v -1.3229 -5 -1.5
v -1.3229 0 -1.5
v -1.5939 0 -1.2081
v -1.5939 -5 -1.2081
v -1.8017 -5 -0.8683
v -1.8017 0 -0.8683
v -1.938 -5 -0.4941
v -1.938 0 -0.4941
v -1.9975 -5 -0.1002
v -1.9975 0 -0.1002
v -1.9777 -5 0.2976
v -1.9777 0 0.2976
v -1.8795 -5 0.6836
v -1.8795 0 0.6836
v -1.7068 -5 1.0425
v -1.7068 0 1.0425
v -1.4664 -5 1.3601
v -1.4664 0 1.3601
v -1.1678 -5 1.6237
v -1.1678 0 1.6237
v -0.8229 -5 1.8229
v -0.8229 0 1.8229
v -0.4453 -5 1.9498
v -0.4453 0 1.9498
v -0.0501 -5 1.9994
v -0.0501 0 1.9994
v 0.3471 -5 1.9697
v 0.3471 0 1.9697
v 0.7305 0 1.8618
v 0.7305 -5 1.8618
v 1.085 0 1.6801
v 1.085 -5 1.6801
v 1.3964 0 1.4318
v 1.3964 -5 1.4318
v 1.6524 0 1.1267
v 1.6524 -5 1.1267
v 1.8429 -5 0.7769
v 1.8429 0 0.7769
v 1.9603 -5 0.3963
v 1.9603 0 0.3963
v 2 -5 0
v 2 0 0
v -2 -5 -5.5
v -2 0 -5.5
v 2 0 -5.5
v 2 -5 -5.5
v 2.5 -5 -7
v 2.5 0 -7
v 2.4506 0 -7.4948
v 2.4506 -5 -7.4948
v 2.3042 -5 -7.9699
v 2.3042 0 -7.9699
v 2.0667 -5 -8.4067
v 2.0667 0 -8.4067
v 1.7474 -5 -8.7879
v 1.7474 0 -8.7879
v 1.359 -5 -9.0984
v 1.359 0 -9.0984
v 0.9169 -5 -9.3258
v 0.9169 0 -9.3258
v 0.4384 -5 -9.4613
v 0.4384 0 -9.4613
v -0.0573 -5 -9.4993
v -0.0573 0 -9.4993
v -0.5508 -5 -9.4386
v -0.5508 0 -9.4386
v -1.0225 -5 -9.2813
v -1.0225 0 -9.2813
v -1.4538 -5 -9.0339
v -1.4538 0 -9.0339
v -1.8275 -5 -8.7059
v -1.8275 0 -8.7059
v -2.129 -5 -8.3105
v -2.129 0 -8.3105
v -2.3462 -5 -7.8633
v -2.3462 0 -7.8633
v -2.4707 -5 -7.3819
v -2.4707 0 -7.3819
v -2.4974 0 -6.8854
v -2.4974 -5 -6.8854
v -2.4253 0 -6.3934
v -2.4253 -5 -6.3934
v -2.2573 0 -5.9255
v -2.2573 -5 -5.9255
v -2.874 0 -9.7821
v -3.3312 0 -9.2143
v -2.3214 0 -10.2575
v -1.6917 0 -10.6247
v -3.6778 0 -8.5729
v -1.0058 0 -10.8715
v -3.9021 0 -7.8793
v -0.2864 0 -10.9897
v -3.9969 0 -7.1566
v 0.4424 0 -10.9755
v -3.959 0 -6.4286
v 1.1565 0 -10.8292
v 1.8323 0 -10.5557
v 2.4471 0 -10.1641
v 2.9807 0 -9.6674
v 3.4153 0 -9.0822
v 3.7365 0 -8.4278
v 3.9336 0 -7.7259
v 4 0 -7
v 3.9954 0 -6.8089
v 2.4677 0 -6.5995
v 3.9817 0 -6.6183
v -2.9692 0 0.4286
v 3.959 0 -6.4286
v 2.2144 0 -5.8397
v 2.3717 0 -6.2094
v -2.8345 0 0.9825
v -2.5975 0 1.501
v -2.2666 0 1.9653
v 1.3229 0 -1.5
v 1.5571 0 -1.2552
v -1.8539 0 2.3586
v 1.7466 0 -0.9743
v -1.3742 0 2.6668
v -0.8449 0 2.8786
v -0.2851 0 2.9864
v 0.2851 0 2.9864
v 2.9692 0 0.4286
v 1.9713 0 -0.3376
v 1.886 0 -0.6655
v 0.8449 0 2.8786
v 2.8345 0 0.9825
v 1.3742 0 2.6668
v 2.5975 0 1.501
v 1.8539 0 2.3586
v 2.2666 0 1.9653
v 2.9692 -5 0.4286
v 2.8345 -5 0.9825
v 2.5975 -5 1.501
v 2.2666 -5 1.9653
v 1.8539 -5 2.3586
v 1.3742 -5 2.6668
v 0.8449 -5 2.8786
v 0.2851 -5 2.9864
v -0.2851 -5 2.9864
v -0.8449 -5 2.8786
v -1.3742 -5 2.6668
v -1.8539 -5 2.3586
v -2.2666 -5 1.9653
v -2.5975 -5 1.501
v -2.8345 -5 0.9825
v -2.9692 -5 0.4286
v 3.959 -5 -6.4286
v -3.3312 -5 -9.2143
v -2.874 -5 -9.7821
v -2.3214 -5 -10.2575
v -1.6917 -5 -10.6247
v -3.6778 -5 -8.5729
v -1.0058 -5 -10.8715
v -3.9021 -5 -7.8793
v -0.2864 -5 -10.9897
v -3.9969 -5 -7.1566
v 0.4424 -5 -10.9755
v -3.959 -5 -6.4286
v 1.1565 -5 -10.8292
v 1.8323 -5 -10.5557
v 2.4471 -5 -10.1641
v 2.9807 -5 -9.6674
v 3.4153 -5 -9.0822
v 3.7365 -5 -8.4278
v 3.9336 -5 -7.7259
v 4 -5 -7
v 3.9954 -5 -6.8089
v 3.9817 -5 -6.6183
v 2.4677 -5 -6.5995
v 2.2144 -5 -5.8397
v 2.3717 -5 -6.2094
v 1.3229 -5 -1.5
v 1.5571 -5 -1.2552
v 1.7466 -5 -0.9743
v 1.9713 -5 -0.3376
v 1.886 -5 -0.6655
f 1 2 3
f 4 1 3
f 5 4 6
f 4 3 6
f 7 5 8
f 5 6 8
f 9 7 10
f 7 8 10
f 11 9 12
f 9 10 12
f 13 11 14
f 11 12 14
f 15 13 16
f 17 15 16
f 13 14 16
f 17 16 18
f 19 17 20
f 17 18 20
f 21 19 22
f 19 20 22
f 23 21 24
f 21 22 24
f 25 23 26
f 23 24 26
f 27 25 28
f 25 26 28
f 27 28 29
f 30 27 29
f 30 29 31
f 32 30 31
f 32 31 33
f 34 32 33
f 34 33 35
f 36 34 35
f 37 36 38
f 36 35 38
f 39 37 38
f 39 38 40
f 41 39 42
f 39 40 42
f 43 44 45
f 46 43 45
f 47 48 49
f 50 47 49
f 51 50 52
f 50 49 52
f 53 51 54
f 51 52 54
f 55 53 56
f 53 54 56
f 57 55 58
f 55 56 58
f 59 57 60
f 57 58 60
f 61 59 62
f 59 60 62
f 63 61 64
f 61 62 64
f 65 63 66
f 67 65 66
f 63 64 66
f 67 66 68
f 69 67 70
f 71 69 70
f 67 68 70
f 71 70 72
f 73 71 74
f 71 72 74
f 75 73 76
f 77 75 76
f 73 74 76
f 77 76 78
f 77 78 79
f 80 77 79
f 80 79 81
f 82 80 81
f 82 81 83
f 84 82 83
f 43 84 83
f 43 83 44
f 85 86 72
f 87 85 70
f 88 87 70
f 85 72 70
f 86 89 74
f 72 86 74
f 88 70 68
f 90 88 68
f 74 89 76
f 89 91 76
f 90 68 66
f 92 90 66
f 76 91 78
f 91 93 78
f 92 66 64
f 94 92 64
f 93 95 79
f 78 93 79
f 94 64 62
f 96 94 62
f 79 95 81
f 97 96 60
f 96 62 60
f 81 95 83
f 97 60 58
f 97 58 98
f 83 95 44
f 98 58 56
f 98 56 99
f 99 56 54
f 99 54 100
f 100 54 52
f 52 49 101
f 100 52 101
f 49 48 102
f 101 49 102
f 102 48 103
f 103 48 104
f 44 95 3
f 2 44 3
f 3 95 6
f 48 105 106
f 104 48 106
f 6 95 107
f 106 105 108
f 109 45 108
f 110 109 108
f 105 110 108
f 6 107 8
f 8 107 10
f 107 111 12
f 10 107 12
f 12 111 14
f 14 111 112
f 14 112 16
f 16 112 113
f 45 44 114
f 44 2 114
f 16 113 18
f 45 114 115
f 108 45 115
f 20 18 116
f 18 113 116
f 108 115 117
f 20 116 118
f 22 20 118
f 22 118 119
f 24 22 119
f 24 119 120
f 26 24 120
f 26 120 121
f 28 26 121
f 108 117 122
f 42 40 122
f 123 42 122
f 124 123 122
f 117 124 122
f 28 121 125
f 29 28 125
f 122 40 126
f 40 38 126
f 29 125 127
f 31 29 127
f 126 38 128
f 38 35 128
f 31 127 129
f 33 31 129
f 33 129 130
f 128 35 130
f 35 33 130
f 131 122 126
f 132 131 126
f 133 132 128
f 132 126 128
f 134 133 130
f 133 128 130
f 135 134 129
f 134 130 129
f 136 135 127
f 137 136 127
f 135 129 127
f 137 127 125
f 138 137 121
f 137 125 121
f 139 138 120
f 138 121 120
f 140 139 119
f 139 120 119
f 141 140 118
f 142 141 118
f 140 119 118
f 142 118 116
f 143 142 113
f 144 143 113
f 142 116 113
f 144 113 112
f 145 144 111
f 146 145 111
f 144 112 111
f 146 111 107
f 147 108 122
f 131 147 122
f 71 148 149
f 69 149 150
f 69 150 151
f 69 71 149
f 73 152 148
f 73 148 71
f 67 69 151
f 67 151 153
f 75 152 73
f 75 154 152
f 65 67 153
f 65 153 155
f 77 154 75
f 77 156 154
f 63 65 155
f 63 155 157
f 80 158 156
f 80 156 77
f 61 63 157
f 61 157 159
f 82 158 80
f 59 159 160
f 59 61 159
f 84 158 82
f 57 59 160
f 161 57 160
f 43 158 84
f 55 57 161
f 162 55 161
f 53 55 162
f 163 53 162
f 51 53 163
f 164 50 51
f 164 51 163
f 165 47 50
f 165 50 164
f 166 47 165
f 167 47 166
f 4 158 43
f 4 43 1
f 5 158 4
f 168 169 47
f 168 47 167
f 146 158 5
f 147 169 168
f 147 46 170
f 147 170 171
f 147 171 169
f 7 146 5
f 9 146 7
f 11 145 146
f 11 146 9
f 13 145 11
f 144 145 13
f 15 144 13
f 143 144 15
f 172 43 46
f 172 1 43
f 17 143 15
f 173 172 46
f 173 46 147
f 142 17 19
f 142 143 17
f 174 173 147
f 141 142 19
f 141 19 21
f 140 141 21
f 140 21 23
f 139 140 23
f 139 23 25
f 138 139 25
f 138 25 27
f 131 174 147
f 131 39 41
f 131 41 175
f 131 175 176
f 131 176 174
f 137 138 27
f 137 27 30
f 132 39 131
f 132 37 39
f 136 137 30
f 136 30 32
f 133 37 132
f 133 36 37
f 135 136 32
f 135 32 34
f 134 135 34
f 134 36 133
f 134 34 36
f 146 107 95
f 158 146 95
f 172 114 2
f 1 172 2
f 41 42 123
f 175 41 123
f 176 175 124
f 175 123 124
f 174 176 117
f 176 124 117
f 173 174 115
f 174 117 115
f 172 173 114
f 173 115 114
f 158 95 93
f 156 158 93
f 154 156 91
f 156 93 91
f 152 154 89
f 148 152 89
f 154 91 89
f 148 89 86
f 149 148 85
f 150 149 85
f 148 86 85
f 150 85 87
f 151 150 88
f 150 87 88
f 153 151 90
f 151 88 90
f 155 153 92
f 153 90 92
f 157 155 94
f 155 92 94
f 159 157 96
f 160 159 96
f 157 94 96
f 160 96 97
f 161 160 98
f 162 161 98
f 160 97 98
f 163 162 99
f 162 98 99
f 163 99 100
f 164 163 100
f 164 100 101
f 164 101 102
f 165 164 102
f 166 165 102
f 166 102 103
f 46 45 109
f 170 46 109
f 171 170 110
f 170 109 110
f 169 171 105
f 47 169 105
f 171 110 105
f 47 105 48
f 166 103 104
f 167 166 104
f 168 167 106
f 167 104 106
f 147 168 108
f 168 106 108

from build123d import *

# Parameters (mm, degrees)
F1_DEPTH = 5


with BuildPart() as f1:
    # F0 (on Front) → F1 (new body)
    with BuildSketch(Plane.XZ):
        with BuildLine():
            ThreePointArc((0, -3), (2.12132, -2.12132), (3, 0))
            ThreePointArc((3, 0), (2.992298, 0.214837), (2.96923, 0.428571))
            ThreePointArc((2.96923, 0.428571), (0, 3), (-2.96923, 0.428571))
            ThreePointArc((-2.96923, 0.428571), (-2.267787, -1.963961), (0, -3))
        make_face()
        with BuildLine():
            ThreePointArc((-1.322876, -1.5), (-0.822876, 1.822876), (2, 0))
            ThreePointArc((2, 0), (1.822876, -0.822876), (1.322876, -1.5))
            ThreePointArc((1.322876, -1.5), (0, -2), (-1.322876, -1.5))
        make_face(mode=Mode.SUBTRACT)
        with BuildLine():
            ThreePointArc((2.96923, 0.428571), (2.992298, 0.214837), (3, 0))
            ThreePointArc((3, 0), (2.12132, -2.12132), (0, -3))
            ThreePointArc((0, -3), (2.618615, -3.976284), (3.958973, -6.428571))
            Line((3.958973, -6.428571), (2.96923, 0.428571))
        make_face()
        with BuildLine():
            ThreePointArc((-3.958973, -6.428571), (-2.618615, -3.976284), (0, -3))
            ThreePointArc((0, -3), (-2.267787, -1.963961), (-2.96923, 0.428571))
            Line((-2.96923, 0.428571), (-3.958973, -6.428571))
        make_face()
        with BuildLine():
            ThreePointArc((3.958973, -6.428571), (2.618615, -3.976284), (0, -3))
            ThreePointArc((0, -3), (-2.618615, -3.976284), (-3.958973, -6.428571))
            ThreePointArc((-3.958973, -6.428571), (-0.28645, -10.98973), (4, -7))
            ThreePointArc((4, -7), (3.98973, -6.71355), (3.958973, -6.428571))
        make_face()
        with BuildLine():
            ThreePointArc((2, -5.5), (2.371708, -6.209431), (2.5, -7))
            ThreePointArc((2.5, -7), (-0.790569, -9.371708), (-2, -5.5))
            ThreePointArc((-2, -5.5), (0, -4.5), (2, -5.5))
        make_face(mode=Mode.SUBTRACT)
        with BuildLine():
            Line((-2, -5.5), (2, -5.5))
            ThreePointArc((2, -5.5), (0, -4.5), (-2, -5.5))
        make_face()
        with BuildLine():
            Line((1.322876, -1.5), (-1.322876, -1.5))
            ThreePointArc((-1.322876, -1.5), (0, -2), (1.322876, -1.5))
        make_face()
    extrude(amount=F1_DEPTH)


solid = f1.part
